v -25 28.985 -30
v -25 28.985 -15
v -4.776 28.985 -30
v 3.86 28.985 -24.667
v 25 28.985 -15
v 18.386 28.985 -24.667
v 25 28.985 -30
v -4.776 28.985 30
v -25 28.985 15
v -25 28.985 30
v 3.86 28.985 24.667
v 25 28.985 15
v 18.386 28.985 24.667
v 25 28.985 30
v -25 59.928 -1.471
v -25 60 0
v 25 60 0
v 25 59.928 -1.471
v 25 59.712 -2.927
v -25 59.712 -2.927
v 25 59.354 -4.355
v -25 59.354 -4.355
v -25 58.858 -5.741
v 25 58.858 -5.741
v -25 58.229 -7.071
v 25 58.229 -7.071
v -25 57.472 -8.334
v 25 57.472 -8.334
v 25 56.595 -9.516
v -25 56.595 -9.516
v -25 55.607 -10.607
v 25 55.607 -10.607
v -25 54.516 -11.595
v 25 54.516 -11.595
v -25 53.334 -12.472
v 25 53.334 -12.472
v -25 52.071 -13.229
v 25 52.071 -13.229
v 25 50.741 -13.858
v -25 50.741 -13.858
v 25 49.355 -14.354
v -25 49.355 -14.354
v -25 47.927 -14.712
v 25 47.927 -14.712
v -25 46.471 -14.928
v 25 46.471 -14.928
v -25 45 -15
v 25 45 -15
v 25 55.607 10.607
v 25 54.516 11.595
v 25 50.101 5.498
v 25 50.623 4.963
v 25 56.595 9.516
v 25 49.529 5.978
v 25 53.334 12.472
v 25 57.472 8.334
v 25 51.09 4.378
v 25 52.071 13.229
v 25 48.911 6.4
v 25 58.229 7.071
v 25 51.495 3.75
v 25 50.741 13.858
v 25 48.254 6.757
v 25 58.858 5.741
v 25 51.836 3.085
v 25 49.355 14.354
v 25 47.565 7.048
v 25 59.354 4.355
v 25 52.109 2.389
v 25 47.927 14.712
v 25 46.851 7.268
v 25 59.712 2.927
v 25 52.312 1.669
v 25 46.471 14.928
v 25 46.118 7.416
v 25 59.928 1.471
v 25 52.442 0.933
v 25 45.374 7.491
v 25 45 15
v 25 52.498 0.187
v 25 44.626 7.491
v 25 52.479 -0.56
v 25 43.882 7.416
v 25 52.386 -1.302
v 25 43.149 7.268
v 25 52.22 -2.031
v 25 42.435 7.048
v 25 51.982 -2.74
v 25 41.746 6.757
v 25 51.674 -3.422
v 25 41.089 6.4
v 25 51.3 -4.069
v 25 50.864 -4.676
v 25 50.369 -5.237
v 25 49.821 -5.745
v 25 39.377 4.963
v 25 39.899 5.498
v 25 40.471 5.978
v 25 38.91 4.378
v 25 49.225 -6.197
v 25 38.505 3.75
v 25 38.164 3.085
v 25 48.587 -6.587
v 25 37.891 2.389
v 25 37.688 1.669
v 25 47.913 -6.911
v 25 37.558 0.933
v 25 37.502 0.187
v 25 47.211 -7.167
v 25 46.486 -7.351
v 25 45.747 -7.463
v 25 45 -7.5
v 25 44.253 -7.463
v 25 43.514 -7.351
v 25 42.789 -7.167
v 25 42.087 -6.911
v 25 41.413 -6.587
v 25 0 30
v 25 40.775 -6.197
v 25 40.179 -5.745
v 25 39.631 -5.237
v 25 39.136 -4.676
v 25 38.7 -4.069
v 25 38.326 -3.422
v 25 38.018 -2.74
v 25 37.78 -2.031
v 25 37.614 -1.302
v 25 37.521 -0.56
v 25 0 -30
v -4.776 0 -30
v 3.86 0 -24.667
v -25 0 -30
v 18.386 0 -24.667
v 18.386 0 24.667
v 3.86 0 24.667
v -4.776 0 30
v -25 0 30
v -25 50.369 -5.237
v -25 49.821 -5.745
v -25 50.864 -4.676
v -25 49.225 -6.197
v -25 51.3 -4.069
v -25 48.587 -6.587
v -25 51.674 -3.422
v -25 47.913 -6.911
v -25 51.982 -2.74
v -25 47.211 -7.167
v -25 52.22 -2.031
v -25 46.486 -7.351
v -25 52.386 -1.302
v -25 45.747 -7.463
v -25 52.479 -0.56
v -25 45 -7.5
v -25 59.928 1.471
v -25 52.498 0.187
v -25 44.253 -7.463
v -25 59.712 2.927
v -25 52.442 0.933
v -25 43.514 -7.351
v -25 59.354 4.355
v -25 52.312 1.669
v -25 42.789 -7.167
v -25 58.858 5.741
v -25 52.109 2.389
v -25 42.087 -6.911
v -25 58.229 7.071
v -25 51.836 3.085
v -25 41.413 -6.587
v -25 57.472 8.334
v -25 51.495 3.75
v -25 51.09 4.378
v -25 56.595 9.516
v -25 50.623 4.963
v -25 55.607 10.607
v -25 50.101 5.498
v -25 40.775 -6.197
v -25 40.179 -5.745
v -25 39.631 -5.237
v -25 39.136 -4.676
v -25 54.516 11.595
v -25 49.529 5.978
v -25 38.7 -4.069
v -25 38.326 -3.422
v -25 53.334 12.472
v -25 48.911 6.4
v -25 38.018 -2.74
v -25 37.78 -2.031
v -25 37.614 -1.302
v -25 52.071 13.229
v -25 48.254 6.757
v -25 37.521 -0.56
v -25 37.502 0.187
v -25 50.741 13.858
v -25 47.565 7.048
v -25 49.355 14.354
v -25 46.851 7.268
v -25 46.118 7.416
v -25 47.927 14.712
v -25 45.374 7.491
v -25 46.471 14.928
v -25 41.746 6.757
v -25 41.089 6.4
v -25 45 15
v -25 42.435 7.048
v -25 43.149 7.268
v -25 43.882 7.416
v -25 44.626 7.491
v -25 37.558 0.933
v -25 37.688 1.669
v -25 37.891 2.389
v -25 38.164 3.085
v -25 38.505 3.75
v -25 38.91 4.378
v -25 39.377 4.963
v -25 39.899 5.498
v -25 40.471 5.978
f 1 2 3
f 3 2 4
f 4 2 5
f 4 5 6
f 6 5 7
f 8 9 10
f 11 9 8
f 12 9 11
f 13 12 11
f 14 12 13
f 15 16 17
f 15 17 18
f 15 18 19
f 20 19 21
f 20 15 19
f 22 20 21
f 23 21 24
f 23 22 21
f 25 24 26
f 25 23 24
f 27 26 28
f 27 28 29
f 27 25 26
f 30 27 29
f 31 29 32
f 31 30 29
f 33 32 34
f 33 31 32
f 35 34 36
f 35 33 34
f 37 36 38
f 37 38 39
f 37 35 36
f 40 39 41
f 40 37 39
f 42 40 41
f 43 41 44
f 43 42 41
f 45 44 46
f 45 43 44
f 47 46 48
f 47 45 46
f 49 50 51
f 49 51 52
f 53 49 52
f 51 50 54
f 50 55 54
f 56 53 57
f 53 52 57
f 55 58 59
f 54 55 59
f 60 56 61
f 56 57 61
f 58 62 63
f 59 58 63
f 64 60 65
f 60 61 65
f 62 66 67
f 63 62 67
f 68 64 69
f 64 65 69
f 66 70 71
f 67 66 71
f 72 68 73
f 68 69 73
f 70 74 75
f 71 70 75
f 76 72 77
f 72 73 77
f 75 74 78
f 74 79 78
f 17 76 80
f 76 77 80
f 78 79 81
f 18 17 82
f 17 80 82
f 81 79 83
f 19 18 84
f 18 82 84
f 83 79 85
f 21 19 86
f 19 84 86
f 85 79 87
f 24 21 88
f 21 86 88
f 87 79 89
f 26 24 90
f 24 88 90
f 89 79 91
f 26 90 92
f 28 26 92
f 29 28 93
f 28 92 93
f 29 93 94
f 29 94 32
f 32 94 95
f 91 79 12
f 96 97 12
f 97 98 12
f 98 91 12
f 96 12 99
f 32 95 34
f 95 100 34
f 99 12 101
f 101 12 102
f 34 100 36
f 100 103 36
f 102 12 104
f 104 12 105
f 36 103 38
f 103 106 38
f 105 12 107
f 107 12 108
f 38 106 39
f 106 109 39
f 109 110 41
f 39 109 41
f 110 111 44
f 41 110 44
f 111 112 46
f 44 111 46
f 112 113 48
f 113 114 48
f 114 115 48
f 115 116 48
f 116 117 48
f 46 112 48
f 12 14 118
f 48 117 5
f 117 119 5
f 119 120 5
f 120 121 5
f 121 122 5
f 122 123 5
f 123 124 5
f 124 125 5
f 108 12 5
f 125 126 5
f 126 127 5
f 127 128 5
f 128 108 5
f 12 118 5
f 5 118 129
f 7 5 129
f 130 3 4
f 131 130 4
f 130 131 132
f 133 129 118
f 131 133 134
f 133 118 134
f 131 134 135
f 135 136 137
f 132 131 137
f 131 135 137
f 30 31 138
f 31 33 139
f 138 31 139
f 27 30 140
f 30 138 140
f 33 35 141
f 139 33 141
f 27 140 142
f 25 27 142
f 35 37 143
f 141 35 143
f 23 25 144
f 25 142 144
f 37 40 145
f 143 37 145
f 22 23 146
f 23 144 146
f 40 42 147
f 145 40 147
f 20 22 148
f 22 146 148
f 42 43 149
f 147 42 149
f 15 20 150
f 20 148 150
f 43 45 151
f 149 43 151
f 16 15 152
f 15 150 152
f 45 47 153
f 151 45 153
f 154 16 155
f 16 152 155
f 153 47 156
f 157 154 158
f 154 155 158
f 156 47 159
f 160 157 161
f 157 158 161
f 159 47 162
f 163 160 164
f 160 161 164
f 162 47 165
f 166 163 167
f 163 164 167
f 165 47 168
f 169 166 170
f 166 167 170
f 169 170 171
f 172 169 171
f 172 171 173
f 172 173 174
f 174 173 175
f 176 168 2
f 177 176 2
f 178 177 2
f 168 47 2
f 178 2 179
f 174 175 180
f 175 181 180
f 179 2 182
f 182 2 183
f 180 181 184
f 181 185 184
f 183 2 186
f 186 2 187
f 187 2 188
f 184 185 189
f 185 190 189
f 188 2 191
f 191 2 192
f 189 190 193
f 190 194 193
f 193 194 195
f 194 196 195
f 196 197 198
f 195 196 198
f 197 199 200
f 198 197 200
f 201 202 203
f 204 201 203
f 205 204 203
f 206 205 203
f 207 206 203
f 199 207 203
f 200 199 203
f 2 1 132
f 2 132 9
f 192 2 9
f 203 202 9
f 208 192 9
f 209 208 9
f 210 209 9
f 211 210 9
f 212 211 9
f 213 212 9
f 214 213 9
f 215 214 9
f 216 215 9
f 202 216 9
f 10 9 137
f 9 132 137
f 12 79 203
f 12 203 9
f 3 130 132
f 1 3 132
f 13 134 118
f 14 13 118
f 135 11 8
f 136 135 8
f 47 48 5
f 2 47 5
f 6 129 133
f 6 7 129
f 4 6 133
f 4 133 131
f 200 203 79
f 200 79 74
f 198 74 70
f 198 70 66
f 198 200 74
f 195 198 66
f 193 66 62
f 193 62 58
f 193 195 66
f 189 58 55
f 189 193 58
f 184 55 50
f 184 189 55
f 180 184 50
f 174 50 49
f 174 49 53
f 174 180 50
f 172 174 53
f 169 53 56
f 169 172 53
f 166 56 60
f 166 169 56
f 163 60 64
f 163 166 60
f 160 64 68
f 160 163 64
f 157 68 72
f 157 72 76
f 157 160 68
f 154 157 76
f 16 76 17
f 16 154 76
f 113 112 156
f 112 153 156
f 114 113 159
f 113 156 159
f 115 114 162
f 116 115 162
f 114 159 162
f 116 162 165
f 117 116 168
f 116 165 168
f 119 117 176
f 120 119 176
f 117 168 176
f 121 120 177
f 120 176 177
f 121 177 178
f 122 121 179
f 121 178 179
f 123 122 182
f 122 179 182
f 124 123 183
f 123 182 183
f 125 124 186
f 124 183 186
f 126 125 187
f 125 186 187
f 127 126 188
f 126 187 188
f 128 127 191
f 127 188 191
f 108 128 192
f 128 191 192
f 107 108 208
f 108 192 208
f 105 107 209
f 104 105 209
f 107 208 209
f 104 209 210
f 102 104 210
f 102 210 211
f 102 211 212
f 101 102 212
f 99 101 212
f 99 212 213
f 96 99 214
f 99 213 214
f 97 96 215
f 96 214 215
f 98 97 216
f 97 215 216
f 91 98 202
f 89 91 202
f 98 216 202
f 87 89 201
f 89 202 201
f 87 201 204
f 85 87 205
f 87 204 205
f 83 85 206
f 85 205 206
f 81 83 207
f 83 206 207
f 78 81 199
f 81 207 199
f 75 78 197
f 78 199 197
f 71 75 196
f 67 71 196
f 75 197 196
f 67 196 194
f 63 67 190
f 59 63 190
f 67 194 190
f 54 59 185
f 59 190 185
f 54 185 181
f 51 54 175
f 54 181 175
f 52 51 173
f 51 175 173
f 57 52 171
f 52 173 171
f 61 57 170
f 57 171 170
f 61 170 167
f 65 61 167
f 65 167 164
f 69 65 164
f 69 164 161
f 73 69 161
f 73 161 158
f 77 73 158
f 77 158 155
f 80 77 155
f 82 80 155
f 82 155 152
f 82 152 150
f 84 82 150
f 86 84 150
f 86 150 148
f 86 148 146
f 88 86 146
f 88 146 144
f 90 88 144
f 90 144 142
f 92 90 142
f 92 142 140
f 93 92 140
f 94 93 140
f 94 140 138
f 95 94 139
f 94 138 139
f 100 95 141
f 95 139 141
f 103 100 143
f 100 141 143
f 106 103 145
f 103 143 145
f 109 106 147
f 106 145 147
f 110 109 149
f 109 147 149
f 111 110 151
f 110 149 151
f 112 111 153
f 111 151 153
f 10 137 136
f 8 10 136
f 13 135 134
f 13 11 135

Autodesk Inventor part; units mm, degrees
ref_plane "YZ Plane" through (0, 0, 0) normal (1, 0, 0) x (0, 1, 0)
ref_plane "XZ Plane" through (0, 0, 0) normal (0, 1, 0) x (-1, 0, 0)
sketch "Esboço1" plane through (0, 0, 0) normal (0, 1, 0) x (-1, 0, 0)
  line L0 (25, 30) -> (-25, 30)
  line L1 (-25, 30) -> (-25, -30)
  line L2 (-25, -30) -> (25, -30)
  line L3 (25, -30) -> (25, 30)
  line L4 (25, 30) -> (-25, -30) construction
  line L5 (-25, 30) -> (25, -30) construction
  point P0 (0, 0)
  dimension "d0" = 50
  dimension "d1" = 60
extrude "Extrusão1" add sketch "Esboço1" along normal blind 60
sketch "Esboço2" plane through (25, 0, 30) normal (1, 0, 0) x (0, 0, -1)
  line L0 (0, 60) -> (15, 60)
  line L1 (15, 60) -> (15, 28.9851)
  line L2 (15, 28.9851) -> (0, 28.9851)
  line L3 (0, 28.9851) -> (0, 60)
  line L4 (0, 60) -> (60, 60) projected
  line L5 (60, 60) -> (45, 60)
  line L6 (45, 60) -> (45, 28.9851)
  line L7 (45, 28.9851) -> (60, 28.9851)
  line L8 (60, 28.9851) -> (60, 60)
  point P0 (30, 0)
  dimension "d4" = 15
  dimension "d5" = 15
extrude "Extrusão2" cut sketch "Esboço2" against normal blind 60
fillet "Arredondamento1" radius 15 2 edges at (0, 60, 15) (0, 60, -15)
sketch "Esboço3" plane through (25, 0, 30) normal (1, 0, 0) x (0, 0, -1)
  arc A0 (45, 45) -> (15, 45) centre (30, 45) ccw projected
  point P0 (30, 0)
hole "Furo1" at (25, 45, 0) direction (-1, 0, 0) diameter 15 end through all
sketch "Esboço4" plane through (25, 28.9851, 30) normal (0, 1, 0) x (1, 0, 0)
  line L0 (0, 0) -> (-50, 0) projected
  line L1 (-50, 0) -> (-29.7763, 0)
  line L2 (-21.1397, 5.3332) -> (-6.6144, 5.3332)
  line L3 (-6.6144, 5.3332) -> (0, 0)
  line L4 (0, 0) -> (-34.3564, 0)
  line L5 (-21.1397, 5.3332) -> (-29.7763, 0)
  point P0 (-25, 30)
extrude "Extrusão3" cut sketch "Esboço4" against normal blind 60
mirror "Espelhar1" about plane through (0, 0, 0) normal (0, 0, 1) of "Extrusão3"
